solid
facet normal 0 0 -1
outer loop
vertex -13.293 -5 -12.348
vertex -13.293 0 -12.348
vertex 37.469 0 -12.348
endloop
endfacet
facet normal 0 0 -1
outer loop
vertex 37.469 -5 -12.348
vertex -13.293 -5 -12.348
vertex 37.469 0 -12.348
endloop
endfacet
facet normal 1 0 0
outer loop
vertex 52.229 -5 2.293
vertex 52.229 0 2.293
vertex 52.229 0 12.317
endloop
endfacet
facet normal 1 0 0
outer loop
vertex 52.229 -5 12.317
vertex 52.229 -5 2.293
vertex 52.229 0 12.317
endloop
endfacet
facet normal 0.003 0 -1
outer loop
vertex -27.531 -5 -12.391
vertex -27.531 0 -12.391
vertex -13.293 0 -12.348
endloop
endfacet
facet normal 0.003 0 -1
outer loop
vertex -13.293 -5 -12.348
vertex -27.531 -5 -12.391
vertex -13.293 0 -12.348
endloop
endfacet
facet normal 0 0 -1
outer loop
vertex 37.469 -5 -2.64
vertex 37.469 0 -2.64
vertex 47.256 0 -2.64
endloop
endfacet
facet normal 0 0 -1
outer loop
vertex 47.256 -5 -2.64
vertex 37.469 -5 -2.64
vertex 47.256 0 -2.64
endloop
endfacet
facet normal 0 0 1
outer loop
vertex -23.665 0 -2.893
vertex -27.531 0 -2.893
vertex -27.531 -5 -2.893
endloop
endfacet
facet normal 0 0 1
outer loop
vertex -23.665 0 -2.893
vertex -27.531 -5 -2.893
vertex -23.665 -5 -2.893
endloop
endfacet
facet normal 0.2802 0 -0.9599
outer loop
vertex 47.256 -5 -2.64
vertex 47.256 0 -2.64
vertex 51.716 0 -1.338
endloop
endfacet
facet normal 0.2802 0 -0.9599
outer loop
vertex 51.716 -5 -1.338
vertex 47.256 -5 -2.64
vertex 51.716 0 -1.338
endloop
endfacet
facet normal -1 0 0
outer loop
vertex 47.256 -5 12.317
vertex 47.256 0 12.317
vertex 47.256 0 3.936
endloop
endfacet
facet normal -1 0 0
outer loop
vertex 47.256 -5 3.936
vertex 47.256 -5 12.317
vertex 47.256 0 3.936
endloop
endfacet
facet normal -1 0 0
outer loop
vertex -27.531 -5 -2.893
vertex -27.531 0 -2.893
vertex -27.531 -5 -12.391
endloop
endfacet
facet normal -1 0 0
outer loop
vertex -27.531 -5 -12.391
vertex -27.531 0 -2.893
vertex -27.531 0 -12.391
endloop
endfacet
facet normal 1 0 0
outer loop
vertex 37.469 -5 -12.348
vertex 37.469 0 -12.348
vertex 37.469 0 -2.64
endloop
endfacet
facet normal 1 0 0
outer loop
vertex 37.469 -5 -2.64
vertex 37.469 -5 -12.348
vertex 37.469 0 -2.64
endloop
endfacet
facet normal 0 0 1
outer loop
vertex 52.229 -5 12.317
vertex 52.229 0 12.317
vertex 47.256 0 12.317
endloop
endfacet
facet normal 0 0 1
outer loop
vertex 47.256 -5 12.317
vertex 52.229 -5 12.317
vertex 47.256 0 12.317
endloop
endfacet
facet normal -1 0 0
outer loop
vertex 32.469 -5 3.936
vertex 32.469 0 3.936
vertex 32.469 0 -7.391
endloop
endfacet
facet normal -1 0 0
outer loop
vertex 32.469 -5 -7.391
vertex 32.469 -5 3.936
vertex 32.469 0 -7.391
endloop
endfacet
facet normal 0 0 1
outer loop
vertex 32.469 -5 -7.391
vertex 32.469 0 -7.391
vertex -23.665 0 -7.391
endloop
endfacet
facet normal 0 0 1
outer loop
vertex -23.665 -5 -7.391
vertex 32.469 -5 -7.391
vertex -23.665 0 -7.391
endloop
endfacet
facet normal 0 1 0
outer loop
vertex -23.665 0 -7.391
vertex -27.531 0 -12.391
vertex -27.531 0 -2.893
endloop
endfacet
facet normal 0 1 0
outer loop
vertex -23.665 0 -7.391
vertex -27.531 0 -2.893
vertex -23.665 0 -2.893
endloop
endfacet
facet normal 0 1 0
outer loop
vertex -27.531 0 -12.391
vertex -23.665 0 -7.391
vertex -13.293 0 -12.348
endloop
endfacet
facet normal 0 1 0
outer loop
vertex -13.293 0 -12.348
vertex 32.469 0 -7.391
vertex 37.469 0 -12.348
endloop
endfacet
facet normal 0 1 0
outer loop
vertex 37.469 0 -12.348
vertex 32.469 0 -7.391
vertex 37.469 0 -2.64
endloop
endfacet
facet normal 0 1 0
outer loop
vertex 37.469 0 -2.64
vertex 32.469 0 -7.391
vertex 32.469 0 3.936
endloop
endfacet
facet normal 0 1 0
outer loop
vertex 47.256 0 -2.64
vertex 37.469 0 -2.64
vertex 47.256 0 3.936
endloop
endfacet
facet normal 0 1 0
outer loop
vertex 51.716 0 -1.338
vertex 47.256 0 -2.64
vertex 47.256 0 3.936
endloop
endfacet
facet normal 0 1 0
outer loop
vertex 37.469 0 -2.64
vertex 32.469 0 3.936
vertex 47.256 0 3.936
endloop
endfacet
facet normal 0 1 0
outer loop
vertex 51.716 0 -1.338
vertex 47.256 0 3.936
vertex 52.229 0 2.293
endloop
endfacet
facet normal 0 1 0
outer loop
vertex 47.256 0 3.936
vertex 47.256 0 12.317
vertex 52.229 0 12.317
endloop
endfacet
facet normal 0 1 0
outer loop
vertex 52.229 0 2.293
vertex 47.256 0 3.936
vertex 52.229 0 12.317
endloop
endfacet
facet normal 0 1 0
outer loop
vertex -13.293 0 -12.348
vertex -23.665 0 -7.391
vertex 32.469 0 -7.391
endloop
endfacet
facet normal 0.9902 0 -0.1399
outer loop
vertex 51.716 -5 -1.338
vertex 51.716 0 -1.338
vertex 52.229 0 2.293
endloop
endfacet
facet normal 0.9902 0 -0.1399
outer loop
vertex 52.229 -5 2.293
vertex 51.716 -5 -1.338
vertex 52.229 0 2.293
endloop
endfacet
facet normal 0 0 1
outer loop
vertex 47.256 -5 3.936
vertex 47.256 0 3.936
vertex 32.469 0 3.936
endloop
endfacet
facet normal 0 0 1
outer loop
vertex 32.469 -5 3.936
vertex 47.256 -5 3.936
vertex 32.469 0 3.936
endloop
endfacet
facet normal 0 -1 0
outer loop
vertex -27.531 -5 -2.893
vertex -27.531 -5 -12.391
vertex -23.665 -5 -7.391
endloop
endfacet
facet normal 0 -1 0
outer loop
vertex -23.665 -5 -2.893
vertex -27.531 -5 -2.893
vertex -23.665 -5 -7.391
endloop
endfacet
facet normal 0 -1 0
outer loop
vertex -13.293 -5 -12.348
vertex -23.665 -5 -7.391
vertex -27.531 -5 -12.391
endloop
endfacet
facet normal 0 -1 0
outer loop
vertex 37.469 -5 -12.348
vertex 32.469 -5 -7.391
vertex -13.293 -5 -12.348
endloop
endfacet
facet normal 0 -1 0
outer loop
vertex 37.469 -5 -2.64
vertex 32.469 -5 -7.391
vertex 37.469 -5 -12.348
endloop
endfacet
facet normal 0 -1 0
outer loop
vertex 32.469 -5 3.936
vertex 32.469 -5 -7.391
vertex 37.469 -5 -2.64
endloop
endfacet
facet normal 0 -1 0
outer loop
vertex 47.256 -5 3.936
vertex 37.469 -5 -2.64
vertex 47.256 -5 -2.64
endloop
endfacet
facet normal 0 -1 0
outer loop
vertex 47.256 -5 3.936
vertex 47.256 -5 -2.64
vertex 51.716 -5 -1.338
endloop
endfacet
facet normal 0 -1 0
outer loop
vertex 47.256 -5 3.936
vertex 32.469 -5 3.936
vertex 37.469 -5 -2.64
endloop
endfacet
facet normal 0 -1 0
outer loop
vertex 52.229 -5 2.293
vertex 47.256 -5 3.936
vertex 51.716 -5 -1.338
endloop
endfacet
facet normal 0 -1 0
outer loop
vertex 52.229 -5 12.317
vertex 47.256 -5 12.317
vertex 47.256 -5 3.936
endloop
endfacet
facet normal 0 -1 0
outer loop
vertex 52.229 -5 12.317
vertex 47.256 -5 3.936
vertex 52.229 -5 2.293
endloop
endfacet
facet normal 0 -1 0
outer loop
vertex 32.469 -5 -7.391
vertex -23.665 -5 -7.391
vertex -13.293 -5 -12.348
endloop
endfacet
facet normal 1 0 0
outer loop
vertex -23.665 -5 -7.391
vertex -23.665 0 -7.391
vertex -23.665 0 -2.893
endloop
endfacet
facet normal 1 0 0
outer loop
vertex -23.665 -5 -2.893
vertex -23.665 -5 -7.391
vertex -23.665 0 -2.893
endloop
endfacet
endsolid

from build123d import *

# Parameters (mm, degrees)
F0_W     = 3.8658287376
F0_H     = 4.4971403014
F1_DEPTH = 5


with BuildPart() as f1:
    # F0 (on Front) → F1 (new body)
    with BuildSketch(Plane.XZ):
        Polygon((-27.5305788964, -12.3905977234), (-13.2927056402, -12.3482672498), (37.4694211036, -12.3482672498), (37.4694211036, -2.6401227806), (47.2564931819, -2.6401227806), (51.7159264395, -1.3378107687), (52.2289585182, 2.292877296), (52.2289585182, 12.3167335987), (47.2564931819, 12.3167335987), (47.2564931819, 3.9355711732), (32.4694211036, 3.9355711732), (32.4694211036, -7.3905977234), (-10.1355845109, -7.3905977234), (-23.6647501588, -7.3905977234), (-27.5305788964, -7.3905977234), align=None)
        with Locations((-25.5976645276, -5.1420275727)):
            Rectangle(F0_W, F0_H)
    extrude(amount=F1_DEPTH)


solid = f1.part
